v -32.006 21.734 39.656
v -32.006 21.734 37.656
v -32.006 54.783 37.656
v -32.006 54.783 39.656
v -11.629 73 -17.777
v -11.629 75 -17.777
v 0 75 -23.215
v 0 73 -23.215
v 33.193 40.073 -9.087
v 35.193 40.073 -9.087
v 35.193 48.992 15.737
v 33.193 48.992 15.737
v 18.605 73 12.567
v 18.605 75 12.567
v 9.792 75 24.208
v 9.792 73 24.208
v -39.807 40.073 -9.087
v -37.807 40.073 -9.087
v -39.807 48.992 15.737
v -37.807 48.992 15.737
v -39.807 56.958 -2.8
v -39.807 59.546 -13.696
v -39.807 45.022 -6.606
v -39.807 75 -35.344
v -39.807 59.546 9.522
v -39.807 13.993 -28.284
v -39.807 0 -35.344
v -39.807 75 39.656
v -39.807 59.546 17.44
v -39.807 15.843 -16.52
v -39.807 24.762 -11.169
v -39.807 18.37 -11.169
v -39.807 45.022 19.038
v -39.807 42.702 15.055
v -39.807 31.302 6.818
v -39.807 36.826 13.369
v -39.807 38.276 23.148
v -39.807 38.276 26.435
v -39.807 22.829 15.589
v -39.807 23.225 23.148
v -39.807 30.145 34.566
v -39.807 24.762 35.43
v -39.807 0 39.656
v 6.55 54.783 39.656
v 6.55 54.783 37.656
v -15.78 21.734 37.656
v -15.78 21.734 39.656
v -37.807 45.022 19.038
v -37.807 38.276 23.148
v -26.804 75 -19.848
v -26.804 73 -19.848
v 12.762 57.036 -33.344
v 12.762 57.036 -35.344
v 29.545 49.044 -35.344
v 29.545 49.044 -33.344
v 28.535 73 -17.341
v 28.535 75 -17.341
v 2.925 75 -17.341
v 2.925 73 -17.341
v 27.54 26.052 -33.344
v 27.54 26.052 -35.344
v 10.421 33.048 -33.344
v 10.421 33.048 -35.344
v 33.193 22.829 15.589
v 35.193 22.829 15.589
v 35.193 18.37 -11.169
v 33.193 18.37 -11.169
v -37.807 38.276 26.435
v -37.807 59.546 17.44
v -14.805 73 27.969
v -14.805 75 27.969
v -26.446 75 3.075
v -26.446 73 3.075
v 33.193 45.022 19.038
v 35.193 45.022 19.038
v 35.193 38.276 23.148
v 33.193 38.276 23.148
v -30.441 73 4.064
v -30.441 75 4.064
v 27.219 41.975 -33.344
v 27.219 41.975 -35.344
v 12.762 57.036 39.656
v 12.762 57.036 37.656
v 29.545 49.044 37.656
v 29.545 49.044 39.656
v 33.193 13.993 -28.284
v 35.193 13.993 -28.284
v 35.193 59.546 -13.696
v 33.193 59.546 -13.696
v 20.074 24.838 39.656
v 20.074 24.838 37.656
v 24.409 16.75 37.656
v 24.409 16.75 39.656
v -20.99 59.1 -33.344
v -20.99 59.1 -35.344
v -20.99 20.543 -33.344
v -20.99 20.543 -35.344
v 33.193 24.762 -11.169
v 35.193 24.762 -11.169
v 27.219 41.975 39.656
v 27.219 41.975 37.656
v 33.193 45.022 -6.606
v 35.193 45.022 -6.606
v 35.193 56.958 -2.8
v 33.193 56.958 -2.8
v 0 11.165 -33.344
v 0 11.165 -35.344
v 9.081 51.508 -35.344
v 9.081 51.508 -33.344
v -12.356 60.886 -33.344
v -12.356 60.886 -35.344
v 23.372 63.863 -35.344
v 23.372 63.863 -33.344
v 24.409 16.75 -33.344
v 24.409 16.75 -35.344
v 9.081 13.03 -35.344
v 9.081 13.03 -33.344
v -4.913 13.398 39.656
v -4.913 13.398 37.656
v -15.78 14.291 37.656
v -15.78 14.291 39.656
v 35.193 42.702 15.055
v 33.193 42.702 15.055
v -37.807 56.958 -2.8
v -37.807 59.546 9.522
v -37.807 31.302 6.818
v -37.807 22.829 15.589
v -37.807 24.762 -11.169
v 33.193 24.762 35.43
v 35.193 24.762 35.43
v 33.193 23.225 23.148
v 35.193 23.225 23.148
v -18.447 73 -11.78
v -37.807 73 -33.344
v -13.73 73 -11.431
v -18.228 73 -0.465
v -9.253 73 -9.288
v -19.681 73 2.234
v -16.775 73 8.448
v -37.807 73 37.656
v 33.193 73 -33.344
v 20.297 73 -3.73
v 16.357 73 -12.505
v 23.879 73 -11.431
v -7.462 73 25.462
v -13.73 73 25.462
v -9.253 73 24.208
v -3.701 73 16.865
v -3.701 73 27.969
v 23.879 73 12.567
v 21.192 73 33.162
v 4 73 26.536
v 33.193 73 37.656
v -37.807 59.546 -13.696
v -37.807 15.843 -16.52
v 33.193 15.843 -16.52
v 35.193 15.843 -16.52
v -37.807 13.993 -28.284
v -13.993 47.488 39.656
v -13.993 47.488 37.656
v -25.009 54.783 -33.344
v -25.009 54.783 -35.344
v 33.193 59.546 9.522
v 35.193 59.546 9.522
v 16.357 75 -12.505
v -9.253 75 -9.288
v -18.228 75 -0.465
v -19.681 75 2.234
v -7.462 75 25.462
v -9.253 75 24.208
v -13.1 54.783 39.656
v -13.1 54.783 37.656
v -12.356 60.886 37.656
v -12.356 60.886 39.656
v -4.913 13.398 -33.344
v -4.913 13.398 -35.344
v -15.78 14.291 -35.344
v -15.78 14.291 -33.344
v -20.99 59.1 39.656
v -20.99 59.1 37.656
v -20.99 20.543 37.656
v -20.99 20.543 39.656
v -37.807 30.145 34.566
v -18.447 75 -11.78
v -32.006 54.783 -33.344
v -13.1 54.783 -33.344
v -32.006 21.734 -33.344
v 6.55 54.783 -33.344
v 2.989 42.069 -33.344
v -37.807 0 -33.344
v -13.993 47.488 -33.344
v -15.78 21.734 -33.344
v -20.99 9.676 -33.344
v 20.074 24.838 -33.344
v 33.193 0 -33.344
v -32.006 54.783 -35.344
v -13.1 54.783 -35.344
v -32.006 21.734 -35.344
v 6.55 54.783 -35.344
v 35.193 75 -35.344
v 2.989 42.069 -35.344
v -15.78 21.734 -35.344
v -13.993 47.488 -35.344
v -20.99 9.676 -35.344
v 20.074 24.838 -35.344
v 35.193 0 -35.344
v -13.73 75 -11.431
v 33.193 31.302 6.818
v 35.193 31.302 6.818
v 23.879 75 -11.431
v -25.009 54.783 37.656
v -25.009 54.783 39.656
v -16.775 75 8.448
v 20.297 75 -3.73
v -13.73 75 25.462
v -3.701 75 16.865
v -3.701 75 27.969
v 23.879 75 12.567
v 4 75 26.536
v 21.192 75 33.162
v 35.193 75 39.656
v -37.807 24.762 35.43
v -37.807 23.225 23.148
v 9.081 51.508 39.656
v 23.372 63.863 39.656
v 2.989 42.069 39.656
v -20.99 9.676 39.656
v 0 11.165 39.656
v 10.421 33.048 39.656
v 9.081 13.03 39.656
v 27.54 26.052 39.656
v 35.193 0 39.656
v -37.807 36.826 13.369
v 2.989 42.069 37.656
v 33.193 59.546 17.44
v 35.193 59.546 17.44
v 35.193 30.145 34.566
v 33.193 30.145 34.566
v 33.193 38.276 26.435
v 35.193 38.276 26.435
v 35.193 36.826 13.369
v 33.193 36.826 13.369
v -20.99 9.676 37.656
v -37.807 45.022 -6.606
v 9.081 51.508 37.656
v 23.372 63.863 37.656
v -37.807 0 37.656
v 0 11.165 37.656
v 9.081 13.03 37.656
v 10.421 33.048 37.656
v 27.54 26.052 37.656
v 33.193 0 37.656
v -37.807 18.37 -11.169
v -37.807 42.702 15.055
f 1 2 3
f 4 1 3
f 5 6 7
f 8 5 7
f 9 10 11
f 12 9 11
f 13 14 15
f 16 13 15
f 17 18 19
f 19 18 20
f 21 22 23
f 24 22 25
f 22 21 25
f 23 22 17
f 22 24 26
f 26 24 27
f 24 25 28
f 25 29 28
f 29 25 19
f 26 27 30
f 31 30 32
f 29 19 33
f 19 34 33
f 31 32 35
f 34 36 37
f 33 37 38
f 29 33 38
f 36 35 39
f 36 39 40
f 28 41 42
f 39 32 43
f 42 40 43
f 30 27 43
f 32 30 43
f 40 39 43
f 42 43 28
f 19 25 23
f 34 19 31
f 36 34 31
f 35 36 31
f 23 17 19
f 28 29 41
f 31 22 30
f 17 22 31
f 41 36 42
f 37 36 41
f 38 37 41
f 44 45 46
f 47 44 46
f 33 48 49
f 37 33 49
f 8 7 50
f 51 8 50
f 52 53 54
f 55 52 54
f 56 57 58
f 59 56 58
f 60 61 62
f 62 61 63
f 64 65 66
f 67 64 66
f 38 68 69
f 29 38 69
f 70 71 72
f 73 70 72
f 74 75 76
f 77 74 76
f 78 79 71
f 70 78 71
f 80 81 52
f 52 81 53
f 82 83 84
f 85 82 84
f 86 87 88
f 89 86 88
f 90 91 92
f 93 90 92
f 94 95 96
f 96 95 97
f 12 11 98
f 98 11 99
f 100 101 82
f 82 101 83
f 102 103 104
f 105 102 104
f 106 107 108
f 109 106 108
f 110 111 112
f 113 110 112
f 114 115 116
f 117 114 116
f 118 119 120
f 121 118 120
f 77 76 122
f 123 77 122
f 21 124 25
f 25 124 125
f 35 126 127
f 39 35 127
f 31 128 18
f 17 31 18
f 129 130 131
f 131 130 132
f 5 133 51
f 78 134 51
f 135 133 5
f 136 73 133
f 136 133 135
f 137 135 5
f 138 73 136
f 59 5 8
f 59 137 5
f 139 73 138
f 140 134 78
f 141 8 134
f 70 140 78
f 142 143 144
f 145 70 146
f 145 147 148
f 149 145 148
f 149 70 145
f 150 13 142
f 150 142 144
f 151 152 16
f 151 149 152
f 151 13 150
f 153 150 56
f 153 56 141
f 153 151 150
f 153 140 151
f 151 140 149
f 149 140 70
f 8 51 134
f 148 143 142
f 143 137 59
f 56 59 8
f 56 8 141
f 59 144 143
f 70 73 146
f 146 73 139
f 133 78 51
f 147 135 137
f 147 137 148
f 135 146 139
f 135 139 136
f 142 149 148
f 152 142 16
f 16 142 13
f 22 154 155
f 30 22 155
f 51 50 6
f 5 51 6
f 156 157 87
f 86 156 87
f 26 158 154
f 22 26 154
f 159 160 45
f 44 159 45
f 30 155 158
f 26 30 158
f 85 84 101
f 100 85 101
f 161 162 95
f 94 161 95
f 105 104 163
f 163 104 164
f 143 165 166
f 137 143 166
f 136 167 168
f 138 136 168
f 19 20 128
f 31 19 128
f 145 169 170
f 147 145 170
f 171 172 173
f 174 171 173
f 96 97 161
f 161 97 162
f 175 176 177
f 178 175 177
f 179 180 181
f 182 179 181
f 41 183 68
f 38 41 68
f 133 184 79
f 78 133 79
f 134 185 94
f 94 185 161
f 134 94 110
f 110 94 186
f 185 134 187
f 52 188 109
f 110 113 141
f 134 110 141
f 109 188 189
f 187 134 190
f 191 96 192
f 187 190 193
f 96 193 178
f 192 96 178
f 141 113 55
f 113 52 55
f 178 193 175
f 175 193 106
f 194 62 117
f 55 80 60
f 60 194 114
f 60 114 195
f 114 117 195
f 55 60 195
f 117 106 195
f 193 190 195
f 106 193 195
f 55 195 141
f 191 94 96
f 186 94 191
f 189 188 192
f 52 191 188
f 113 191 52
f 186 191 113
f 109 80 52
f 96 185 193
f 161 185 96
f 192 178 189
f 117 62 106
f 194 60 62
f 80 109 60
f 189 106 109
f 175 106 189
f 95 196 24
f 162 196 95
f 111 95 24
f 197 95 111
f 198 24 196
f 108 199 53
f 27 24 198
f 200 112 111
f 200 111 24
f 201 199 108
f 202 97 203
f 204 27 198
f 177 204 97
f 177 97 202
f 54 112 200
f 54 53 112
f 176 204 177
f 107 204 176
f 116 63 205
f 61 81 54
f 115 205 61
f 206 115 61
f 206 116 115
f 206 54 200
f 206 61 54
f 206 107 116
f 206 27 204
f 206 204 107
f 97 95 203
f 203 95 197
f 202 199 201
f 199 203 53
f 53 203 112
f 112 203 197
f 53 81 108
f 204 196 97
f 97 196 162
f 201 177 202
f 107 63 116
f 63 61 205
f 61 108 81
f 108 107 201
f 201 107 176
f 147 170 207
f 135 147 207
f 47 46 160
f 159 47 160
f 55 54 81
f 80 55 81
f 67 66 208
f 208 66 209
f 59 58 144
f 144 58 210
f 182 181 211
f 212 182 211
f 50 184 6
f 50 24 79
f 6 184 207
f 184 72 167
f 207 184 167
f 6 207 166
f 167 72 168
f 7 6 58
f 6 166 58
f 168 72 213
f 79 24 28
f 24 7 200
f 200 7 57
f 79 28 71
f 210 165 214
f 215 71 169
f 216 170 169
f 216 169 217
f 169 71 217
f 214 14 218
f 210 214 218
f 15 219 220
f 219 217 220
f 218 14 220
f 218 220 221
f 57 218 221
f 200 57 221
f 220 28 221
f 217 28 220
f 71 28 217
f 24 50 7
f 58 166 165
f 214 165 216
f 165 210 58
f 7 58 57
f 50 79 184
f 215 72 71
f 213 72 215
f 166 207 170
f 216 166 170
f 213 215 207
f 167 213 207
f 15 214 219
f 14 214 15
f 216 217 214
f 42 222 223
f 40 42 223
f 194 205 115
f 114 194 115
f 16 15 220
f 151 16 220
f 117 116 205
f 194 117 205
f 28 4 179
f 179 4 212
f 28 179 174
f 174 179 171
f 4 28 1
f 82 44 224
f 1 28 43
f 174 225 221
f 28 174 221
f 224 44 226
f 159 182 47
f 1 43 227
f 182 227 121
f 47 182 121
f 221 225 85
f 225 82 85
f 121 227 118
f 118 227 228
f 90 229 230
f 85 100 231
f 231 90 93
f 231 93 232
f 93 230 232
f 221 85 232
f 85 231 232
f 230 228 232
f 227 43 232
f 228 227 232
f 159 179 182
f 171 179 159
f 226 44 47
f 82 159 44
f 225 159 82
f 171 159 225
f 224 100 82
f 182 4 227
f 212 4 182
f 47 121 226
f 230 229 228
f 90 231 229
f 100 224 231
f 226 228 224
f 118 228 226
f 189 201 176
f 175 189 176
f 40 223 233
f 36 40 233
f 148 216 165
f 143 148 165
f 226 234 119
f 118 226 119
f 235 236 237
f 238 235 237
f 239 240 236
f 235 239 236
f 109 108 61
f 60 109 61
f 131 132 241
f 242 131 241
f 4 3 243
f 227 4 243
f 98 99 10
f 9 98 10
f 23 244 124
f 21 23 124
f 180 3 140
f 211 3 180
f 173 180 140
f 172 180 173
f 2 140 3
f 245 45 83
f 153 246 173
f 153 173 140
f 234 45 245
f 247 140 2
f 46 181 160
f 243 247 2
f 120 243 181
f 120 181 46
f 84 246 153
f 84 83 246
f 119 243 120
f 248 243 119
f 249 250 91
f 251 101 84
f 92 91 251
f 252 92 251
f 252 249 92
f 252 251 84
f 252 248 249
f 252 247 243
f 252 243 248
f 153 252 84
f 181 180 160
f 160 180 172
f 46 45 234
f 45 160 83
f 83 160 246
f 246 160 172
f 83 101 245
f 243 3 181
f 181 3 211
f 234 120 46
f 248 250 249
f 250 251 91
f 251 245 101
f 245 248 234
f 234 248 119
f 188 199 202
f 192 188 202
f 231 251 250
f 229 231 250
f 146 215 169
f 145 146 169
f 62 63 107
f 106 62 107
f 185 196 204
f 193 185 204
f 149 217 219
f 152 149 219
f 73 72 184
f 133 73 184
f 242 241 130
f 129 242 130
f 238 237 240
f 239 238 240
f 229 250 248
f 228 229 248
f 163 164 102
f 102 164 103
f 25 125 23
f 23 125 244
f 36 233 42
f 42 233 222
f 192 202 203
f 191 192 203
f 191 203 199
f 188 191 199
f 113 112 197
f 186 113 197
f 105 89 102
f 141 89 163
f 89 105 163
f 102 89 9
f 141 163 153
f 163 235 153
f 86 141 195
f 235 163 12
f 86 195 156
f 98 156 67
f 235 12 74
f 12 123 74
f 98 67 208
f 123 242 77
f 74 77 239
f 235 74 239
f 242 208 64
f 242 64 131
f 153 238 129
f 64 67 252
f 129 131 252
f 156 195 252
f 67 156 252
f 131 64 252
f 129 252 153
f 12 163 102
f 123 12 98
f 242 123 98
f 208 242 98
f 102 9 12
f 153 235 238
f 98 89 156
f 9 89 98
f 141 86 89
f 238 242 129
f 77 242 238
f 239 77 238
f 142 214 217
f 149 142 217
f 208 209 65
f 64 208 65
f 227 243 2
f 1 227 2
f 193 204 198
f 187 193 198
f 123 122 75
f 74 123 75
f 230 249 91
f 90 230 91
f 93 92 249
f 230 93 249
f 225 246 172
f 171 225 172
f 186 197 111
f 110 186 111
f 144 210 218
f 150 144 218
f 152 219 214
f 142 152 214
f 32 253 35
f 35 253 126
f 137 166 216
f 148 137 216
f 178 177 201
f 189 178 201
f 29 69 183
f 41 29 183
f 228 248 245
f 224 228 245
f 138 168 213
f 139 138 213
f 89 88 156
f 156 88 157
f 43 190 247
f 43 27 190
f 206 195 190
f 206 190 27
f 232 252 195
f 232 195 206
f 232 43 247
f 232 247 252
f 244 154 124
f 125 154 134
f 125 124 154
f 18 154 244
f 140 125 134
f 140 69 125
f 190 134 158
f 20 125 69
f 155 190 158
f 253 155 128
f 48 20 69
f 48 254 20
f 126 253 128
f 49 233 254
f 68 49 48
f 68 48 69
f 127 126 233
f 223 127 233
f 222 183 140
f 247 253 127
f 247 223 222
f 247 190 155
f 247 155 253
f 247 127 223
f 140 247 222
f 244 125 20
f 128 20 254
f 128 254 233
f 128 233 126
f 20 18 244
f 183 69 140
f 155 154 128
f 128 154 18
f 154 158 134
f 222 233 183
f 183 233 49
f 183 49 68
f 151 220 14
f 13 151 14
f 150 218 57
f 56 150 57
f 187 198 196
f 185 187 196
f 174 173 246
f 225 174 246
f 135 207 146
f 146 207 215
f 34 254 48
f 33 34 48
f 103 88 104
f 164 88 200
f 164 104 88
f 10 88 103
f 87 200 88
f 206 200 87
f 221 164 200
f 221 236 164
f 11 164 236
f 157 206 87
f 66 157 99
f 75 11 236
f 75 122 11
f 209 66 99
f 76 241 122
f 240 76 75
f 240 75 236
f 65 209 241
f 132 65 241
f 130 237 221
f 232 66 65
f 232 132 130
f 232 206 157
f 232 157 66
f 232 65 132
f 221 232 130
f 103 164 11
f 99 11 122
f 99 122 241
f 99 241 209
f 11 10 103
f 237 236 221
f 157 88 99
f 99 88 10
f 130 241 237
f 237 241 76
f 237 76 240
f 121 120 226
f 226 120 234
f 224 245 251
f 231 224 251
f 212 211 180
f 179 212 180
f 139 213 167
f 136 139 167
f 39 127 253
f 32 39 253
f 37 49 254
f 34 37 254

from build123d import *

# Parameters (mm, degrees)
F0_W     = 75
F0_H     = 75
F1_DEPTH = 75
F2_T     = -2
F4_DEPTH = 146.3
F6_DEPTH = 84.9
F8_DEPTH = 25


with BuildPart() as f1:
    # F0 (on Front) → F1 (new body)
    with BuildSketch(Plane.XZ):
        with Locations((-2.307421, 2.156376)):
            Rectangle(F0_W, F0_H)
    extrude(amount=-F1_DEPTH)

    # F2
    f2_openings = [f1.faces().sort_by_distance(p)[0] for p in [
        (-2.307421, 0, 2.156376),
    ]]
    offset(amount=F2_T, openings=f2_openings)

    # F3 (on face) → F4 (cut)
    with BuildSketch(Plane(origin=(0, 0, -35.343624), x_dir=(1, 0, 0), z_dir=(0, 0, -1))):
        Polygon((-20.990076, -20.543478), (-25.009453, -54.782614), (-20.990076, -59.099723), align=None)
        Polygon((6.550096, -54.782614), (-15.779775, -21.734407), (-13.993384, -47.488187), align=None)
        Polygon((10.420605, -33.048205), (0, -11.164933), (9.080812, -51.507566), (27.54017, -26.051514), align=None)
        Polygon((23.371927, -63.863426), (-13.100189, -54.782614), (-12.35586, -60.886107), align=None)
        Polygon((-4.912571, -13.397922), (-15.779775, -14.291116), (2.988963, -42.068847), align=None)
        Polygon((-32.006145, -54.782614), (-20.990076, -9.676277), (-32.006145, -21.734407), align=None)
        Polygon((29.545442, -49.04395), (27.218709, -41.974761), (12.761539, -57.036284), align=None)
        Polygon((24.409195, -16.750237), (9.080812, -13.030036), (20.074258, -24.837809), align=None)
    extrude(amount=-F4_DEPTH, mode=Mode.SUBTRACT)

    # F5 (on face) → F6 (cut)
    with BuildSketch(Plane.YZ.offset(35.192579)):
        Polygon((15.842715, -16.520021), (13.993383, -28.284499), (59.546318, -13.695653), align=None)
        Polygon((22.829311, 15.588589), (18.369781, -11.168586), (31.302415, 6.818181), align=None)
        Polygon((48.991881, 15.737241), (24.761772, -11.168586), (40.072825, -9.087472), align=None)
        Polygon((24.761772, 35.430476), (23.225486, 23.14827), (36.825874, 13.36948), align=None)
        Polygon((30.14504, 34.565531), (38.275514, 26.435059), (59.546318, 17.439637), align=None)
        Polygon((59.546318, 9.522333), (45.022078, -6.60581), (56.95831, -2.800056), align=None)
        Polygon((45.022078, 19.038399), (38.275514, 23.14827), (42.701558, 15.054593), align=None)
    extrude(amount=-F6_DEPTH, mode=Mode.SUBTRACT)

    # F7 (on face) → F8 (cut)
    with BuildSketch(Plane(origin=(0, 75, 0), x_dir=(-1, 0, 0), z_dir=(0, 1, 0))):
        Polygon((-20.296717, -3.729921), (3.701246, 27.96888), (-3.999593, 26.536167), align=None)
        Polygon((7.46212, 25.461631), (9.253013, 24.208006), (13.730245, -11.43076), (13.730245, 25.461631), align=None)
        Polygon((9.253013, -9.287988), (3.701246, 16.865345), (-16.356753, -12.505296), align=None)
        Polygon((-23.878502, -11.43076), (-23.878502, 12.567203), (-28.534822, -17.340705), (-2.925058, -17.340705), align=None)
        Polygon((30.441476, 4.064158), (14.80478, 27.96888), (26.445584, 3.075472), (18.446537, -11.779902), align=None)
        Polygon((19.680761, 2.233784), (16.774762, 8.44815), (18.227762, -0.464643), align=None)
        Polygon((0, -23.215262), (26.803762, -19.847956), (11.629337, -17.777083), align=None)
        Polygon((-9.792007, 24.208006), (-21.192163, 33.162467), (-18.604818, 12.567203), align=None)
    extrude(amount=-F8_DEPTH, mode=Mode.SUBTRACT)


solid = f1.part
